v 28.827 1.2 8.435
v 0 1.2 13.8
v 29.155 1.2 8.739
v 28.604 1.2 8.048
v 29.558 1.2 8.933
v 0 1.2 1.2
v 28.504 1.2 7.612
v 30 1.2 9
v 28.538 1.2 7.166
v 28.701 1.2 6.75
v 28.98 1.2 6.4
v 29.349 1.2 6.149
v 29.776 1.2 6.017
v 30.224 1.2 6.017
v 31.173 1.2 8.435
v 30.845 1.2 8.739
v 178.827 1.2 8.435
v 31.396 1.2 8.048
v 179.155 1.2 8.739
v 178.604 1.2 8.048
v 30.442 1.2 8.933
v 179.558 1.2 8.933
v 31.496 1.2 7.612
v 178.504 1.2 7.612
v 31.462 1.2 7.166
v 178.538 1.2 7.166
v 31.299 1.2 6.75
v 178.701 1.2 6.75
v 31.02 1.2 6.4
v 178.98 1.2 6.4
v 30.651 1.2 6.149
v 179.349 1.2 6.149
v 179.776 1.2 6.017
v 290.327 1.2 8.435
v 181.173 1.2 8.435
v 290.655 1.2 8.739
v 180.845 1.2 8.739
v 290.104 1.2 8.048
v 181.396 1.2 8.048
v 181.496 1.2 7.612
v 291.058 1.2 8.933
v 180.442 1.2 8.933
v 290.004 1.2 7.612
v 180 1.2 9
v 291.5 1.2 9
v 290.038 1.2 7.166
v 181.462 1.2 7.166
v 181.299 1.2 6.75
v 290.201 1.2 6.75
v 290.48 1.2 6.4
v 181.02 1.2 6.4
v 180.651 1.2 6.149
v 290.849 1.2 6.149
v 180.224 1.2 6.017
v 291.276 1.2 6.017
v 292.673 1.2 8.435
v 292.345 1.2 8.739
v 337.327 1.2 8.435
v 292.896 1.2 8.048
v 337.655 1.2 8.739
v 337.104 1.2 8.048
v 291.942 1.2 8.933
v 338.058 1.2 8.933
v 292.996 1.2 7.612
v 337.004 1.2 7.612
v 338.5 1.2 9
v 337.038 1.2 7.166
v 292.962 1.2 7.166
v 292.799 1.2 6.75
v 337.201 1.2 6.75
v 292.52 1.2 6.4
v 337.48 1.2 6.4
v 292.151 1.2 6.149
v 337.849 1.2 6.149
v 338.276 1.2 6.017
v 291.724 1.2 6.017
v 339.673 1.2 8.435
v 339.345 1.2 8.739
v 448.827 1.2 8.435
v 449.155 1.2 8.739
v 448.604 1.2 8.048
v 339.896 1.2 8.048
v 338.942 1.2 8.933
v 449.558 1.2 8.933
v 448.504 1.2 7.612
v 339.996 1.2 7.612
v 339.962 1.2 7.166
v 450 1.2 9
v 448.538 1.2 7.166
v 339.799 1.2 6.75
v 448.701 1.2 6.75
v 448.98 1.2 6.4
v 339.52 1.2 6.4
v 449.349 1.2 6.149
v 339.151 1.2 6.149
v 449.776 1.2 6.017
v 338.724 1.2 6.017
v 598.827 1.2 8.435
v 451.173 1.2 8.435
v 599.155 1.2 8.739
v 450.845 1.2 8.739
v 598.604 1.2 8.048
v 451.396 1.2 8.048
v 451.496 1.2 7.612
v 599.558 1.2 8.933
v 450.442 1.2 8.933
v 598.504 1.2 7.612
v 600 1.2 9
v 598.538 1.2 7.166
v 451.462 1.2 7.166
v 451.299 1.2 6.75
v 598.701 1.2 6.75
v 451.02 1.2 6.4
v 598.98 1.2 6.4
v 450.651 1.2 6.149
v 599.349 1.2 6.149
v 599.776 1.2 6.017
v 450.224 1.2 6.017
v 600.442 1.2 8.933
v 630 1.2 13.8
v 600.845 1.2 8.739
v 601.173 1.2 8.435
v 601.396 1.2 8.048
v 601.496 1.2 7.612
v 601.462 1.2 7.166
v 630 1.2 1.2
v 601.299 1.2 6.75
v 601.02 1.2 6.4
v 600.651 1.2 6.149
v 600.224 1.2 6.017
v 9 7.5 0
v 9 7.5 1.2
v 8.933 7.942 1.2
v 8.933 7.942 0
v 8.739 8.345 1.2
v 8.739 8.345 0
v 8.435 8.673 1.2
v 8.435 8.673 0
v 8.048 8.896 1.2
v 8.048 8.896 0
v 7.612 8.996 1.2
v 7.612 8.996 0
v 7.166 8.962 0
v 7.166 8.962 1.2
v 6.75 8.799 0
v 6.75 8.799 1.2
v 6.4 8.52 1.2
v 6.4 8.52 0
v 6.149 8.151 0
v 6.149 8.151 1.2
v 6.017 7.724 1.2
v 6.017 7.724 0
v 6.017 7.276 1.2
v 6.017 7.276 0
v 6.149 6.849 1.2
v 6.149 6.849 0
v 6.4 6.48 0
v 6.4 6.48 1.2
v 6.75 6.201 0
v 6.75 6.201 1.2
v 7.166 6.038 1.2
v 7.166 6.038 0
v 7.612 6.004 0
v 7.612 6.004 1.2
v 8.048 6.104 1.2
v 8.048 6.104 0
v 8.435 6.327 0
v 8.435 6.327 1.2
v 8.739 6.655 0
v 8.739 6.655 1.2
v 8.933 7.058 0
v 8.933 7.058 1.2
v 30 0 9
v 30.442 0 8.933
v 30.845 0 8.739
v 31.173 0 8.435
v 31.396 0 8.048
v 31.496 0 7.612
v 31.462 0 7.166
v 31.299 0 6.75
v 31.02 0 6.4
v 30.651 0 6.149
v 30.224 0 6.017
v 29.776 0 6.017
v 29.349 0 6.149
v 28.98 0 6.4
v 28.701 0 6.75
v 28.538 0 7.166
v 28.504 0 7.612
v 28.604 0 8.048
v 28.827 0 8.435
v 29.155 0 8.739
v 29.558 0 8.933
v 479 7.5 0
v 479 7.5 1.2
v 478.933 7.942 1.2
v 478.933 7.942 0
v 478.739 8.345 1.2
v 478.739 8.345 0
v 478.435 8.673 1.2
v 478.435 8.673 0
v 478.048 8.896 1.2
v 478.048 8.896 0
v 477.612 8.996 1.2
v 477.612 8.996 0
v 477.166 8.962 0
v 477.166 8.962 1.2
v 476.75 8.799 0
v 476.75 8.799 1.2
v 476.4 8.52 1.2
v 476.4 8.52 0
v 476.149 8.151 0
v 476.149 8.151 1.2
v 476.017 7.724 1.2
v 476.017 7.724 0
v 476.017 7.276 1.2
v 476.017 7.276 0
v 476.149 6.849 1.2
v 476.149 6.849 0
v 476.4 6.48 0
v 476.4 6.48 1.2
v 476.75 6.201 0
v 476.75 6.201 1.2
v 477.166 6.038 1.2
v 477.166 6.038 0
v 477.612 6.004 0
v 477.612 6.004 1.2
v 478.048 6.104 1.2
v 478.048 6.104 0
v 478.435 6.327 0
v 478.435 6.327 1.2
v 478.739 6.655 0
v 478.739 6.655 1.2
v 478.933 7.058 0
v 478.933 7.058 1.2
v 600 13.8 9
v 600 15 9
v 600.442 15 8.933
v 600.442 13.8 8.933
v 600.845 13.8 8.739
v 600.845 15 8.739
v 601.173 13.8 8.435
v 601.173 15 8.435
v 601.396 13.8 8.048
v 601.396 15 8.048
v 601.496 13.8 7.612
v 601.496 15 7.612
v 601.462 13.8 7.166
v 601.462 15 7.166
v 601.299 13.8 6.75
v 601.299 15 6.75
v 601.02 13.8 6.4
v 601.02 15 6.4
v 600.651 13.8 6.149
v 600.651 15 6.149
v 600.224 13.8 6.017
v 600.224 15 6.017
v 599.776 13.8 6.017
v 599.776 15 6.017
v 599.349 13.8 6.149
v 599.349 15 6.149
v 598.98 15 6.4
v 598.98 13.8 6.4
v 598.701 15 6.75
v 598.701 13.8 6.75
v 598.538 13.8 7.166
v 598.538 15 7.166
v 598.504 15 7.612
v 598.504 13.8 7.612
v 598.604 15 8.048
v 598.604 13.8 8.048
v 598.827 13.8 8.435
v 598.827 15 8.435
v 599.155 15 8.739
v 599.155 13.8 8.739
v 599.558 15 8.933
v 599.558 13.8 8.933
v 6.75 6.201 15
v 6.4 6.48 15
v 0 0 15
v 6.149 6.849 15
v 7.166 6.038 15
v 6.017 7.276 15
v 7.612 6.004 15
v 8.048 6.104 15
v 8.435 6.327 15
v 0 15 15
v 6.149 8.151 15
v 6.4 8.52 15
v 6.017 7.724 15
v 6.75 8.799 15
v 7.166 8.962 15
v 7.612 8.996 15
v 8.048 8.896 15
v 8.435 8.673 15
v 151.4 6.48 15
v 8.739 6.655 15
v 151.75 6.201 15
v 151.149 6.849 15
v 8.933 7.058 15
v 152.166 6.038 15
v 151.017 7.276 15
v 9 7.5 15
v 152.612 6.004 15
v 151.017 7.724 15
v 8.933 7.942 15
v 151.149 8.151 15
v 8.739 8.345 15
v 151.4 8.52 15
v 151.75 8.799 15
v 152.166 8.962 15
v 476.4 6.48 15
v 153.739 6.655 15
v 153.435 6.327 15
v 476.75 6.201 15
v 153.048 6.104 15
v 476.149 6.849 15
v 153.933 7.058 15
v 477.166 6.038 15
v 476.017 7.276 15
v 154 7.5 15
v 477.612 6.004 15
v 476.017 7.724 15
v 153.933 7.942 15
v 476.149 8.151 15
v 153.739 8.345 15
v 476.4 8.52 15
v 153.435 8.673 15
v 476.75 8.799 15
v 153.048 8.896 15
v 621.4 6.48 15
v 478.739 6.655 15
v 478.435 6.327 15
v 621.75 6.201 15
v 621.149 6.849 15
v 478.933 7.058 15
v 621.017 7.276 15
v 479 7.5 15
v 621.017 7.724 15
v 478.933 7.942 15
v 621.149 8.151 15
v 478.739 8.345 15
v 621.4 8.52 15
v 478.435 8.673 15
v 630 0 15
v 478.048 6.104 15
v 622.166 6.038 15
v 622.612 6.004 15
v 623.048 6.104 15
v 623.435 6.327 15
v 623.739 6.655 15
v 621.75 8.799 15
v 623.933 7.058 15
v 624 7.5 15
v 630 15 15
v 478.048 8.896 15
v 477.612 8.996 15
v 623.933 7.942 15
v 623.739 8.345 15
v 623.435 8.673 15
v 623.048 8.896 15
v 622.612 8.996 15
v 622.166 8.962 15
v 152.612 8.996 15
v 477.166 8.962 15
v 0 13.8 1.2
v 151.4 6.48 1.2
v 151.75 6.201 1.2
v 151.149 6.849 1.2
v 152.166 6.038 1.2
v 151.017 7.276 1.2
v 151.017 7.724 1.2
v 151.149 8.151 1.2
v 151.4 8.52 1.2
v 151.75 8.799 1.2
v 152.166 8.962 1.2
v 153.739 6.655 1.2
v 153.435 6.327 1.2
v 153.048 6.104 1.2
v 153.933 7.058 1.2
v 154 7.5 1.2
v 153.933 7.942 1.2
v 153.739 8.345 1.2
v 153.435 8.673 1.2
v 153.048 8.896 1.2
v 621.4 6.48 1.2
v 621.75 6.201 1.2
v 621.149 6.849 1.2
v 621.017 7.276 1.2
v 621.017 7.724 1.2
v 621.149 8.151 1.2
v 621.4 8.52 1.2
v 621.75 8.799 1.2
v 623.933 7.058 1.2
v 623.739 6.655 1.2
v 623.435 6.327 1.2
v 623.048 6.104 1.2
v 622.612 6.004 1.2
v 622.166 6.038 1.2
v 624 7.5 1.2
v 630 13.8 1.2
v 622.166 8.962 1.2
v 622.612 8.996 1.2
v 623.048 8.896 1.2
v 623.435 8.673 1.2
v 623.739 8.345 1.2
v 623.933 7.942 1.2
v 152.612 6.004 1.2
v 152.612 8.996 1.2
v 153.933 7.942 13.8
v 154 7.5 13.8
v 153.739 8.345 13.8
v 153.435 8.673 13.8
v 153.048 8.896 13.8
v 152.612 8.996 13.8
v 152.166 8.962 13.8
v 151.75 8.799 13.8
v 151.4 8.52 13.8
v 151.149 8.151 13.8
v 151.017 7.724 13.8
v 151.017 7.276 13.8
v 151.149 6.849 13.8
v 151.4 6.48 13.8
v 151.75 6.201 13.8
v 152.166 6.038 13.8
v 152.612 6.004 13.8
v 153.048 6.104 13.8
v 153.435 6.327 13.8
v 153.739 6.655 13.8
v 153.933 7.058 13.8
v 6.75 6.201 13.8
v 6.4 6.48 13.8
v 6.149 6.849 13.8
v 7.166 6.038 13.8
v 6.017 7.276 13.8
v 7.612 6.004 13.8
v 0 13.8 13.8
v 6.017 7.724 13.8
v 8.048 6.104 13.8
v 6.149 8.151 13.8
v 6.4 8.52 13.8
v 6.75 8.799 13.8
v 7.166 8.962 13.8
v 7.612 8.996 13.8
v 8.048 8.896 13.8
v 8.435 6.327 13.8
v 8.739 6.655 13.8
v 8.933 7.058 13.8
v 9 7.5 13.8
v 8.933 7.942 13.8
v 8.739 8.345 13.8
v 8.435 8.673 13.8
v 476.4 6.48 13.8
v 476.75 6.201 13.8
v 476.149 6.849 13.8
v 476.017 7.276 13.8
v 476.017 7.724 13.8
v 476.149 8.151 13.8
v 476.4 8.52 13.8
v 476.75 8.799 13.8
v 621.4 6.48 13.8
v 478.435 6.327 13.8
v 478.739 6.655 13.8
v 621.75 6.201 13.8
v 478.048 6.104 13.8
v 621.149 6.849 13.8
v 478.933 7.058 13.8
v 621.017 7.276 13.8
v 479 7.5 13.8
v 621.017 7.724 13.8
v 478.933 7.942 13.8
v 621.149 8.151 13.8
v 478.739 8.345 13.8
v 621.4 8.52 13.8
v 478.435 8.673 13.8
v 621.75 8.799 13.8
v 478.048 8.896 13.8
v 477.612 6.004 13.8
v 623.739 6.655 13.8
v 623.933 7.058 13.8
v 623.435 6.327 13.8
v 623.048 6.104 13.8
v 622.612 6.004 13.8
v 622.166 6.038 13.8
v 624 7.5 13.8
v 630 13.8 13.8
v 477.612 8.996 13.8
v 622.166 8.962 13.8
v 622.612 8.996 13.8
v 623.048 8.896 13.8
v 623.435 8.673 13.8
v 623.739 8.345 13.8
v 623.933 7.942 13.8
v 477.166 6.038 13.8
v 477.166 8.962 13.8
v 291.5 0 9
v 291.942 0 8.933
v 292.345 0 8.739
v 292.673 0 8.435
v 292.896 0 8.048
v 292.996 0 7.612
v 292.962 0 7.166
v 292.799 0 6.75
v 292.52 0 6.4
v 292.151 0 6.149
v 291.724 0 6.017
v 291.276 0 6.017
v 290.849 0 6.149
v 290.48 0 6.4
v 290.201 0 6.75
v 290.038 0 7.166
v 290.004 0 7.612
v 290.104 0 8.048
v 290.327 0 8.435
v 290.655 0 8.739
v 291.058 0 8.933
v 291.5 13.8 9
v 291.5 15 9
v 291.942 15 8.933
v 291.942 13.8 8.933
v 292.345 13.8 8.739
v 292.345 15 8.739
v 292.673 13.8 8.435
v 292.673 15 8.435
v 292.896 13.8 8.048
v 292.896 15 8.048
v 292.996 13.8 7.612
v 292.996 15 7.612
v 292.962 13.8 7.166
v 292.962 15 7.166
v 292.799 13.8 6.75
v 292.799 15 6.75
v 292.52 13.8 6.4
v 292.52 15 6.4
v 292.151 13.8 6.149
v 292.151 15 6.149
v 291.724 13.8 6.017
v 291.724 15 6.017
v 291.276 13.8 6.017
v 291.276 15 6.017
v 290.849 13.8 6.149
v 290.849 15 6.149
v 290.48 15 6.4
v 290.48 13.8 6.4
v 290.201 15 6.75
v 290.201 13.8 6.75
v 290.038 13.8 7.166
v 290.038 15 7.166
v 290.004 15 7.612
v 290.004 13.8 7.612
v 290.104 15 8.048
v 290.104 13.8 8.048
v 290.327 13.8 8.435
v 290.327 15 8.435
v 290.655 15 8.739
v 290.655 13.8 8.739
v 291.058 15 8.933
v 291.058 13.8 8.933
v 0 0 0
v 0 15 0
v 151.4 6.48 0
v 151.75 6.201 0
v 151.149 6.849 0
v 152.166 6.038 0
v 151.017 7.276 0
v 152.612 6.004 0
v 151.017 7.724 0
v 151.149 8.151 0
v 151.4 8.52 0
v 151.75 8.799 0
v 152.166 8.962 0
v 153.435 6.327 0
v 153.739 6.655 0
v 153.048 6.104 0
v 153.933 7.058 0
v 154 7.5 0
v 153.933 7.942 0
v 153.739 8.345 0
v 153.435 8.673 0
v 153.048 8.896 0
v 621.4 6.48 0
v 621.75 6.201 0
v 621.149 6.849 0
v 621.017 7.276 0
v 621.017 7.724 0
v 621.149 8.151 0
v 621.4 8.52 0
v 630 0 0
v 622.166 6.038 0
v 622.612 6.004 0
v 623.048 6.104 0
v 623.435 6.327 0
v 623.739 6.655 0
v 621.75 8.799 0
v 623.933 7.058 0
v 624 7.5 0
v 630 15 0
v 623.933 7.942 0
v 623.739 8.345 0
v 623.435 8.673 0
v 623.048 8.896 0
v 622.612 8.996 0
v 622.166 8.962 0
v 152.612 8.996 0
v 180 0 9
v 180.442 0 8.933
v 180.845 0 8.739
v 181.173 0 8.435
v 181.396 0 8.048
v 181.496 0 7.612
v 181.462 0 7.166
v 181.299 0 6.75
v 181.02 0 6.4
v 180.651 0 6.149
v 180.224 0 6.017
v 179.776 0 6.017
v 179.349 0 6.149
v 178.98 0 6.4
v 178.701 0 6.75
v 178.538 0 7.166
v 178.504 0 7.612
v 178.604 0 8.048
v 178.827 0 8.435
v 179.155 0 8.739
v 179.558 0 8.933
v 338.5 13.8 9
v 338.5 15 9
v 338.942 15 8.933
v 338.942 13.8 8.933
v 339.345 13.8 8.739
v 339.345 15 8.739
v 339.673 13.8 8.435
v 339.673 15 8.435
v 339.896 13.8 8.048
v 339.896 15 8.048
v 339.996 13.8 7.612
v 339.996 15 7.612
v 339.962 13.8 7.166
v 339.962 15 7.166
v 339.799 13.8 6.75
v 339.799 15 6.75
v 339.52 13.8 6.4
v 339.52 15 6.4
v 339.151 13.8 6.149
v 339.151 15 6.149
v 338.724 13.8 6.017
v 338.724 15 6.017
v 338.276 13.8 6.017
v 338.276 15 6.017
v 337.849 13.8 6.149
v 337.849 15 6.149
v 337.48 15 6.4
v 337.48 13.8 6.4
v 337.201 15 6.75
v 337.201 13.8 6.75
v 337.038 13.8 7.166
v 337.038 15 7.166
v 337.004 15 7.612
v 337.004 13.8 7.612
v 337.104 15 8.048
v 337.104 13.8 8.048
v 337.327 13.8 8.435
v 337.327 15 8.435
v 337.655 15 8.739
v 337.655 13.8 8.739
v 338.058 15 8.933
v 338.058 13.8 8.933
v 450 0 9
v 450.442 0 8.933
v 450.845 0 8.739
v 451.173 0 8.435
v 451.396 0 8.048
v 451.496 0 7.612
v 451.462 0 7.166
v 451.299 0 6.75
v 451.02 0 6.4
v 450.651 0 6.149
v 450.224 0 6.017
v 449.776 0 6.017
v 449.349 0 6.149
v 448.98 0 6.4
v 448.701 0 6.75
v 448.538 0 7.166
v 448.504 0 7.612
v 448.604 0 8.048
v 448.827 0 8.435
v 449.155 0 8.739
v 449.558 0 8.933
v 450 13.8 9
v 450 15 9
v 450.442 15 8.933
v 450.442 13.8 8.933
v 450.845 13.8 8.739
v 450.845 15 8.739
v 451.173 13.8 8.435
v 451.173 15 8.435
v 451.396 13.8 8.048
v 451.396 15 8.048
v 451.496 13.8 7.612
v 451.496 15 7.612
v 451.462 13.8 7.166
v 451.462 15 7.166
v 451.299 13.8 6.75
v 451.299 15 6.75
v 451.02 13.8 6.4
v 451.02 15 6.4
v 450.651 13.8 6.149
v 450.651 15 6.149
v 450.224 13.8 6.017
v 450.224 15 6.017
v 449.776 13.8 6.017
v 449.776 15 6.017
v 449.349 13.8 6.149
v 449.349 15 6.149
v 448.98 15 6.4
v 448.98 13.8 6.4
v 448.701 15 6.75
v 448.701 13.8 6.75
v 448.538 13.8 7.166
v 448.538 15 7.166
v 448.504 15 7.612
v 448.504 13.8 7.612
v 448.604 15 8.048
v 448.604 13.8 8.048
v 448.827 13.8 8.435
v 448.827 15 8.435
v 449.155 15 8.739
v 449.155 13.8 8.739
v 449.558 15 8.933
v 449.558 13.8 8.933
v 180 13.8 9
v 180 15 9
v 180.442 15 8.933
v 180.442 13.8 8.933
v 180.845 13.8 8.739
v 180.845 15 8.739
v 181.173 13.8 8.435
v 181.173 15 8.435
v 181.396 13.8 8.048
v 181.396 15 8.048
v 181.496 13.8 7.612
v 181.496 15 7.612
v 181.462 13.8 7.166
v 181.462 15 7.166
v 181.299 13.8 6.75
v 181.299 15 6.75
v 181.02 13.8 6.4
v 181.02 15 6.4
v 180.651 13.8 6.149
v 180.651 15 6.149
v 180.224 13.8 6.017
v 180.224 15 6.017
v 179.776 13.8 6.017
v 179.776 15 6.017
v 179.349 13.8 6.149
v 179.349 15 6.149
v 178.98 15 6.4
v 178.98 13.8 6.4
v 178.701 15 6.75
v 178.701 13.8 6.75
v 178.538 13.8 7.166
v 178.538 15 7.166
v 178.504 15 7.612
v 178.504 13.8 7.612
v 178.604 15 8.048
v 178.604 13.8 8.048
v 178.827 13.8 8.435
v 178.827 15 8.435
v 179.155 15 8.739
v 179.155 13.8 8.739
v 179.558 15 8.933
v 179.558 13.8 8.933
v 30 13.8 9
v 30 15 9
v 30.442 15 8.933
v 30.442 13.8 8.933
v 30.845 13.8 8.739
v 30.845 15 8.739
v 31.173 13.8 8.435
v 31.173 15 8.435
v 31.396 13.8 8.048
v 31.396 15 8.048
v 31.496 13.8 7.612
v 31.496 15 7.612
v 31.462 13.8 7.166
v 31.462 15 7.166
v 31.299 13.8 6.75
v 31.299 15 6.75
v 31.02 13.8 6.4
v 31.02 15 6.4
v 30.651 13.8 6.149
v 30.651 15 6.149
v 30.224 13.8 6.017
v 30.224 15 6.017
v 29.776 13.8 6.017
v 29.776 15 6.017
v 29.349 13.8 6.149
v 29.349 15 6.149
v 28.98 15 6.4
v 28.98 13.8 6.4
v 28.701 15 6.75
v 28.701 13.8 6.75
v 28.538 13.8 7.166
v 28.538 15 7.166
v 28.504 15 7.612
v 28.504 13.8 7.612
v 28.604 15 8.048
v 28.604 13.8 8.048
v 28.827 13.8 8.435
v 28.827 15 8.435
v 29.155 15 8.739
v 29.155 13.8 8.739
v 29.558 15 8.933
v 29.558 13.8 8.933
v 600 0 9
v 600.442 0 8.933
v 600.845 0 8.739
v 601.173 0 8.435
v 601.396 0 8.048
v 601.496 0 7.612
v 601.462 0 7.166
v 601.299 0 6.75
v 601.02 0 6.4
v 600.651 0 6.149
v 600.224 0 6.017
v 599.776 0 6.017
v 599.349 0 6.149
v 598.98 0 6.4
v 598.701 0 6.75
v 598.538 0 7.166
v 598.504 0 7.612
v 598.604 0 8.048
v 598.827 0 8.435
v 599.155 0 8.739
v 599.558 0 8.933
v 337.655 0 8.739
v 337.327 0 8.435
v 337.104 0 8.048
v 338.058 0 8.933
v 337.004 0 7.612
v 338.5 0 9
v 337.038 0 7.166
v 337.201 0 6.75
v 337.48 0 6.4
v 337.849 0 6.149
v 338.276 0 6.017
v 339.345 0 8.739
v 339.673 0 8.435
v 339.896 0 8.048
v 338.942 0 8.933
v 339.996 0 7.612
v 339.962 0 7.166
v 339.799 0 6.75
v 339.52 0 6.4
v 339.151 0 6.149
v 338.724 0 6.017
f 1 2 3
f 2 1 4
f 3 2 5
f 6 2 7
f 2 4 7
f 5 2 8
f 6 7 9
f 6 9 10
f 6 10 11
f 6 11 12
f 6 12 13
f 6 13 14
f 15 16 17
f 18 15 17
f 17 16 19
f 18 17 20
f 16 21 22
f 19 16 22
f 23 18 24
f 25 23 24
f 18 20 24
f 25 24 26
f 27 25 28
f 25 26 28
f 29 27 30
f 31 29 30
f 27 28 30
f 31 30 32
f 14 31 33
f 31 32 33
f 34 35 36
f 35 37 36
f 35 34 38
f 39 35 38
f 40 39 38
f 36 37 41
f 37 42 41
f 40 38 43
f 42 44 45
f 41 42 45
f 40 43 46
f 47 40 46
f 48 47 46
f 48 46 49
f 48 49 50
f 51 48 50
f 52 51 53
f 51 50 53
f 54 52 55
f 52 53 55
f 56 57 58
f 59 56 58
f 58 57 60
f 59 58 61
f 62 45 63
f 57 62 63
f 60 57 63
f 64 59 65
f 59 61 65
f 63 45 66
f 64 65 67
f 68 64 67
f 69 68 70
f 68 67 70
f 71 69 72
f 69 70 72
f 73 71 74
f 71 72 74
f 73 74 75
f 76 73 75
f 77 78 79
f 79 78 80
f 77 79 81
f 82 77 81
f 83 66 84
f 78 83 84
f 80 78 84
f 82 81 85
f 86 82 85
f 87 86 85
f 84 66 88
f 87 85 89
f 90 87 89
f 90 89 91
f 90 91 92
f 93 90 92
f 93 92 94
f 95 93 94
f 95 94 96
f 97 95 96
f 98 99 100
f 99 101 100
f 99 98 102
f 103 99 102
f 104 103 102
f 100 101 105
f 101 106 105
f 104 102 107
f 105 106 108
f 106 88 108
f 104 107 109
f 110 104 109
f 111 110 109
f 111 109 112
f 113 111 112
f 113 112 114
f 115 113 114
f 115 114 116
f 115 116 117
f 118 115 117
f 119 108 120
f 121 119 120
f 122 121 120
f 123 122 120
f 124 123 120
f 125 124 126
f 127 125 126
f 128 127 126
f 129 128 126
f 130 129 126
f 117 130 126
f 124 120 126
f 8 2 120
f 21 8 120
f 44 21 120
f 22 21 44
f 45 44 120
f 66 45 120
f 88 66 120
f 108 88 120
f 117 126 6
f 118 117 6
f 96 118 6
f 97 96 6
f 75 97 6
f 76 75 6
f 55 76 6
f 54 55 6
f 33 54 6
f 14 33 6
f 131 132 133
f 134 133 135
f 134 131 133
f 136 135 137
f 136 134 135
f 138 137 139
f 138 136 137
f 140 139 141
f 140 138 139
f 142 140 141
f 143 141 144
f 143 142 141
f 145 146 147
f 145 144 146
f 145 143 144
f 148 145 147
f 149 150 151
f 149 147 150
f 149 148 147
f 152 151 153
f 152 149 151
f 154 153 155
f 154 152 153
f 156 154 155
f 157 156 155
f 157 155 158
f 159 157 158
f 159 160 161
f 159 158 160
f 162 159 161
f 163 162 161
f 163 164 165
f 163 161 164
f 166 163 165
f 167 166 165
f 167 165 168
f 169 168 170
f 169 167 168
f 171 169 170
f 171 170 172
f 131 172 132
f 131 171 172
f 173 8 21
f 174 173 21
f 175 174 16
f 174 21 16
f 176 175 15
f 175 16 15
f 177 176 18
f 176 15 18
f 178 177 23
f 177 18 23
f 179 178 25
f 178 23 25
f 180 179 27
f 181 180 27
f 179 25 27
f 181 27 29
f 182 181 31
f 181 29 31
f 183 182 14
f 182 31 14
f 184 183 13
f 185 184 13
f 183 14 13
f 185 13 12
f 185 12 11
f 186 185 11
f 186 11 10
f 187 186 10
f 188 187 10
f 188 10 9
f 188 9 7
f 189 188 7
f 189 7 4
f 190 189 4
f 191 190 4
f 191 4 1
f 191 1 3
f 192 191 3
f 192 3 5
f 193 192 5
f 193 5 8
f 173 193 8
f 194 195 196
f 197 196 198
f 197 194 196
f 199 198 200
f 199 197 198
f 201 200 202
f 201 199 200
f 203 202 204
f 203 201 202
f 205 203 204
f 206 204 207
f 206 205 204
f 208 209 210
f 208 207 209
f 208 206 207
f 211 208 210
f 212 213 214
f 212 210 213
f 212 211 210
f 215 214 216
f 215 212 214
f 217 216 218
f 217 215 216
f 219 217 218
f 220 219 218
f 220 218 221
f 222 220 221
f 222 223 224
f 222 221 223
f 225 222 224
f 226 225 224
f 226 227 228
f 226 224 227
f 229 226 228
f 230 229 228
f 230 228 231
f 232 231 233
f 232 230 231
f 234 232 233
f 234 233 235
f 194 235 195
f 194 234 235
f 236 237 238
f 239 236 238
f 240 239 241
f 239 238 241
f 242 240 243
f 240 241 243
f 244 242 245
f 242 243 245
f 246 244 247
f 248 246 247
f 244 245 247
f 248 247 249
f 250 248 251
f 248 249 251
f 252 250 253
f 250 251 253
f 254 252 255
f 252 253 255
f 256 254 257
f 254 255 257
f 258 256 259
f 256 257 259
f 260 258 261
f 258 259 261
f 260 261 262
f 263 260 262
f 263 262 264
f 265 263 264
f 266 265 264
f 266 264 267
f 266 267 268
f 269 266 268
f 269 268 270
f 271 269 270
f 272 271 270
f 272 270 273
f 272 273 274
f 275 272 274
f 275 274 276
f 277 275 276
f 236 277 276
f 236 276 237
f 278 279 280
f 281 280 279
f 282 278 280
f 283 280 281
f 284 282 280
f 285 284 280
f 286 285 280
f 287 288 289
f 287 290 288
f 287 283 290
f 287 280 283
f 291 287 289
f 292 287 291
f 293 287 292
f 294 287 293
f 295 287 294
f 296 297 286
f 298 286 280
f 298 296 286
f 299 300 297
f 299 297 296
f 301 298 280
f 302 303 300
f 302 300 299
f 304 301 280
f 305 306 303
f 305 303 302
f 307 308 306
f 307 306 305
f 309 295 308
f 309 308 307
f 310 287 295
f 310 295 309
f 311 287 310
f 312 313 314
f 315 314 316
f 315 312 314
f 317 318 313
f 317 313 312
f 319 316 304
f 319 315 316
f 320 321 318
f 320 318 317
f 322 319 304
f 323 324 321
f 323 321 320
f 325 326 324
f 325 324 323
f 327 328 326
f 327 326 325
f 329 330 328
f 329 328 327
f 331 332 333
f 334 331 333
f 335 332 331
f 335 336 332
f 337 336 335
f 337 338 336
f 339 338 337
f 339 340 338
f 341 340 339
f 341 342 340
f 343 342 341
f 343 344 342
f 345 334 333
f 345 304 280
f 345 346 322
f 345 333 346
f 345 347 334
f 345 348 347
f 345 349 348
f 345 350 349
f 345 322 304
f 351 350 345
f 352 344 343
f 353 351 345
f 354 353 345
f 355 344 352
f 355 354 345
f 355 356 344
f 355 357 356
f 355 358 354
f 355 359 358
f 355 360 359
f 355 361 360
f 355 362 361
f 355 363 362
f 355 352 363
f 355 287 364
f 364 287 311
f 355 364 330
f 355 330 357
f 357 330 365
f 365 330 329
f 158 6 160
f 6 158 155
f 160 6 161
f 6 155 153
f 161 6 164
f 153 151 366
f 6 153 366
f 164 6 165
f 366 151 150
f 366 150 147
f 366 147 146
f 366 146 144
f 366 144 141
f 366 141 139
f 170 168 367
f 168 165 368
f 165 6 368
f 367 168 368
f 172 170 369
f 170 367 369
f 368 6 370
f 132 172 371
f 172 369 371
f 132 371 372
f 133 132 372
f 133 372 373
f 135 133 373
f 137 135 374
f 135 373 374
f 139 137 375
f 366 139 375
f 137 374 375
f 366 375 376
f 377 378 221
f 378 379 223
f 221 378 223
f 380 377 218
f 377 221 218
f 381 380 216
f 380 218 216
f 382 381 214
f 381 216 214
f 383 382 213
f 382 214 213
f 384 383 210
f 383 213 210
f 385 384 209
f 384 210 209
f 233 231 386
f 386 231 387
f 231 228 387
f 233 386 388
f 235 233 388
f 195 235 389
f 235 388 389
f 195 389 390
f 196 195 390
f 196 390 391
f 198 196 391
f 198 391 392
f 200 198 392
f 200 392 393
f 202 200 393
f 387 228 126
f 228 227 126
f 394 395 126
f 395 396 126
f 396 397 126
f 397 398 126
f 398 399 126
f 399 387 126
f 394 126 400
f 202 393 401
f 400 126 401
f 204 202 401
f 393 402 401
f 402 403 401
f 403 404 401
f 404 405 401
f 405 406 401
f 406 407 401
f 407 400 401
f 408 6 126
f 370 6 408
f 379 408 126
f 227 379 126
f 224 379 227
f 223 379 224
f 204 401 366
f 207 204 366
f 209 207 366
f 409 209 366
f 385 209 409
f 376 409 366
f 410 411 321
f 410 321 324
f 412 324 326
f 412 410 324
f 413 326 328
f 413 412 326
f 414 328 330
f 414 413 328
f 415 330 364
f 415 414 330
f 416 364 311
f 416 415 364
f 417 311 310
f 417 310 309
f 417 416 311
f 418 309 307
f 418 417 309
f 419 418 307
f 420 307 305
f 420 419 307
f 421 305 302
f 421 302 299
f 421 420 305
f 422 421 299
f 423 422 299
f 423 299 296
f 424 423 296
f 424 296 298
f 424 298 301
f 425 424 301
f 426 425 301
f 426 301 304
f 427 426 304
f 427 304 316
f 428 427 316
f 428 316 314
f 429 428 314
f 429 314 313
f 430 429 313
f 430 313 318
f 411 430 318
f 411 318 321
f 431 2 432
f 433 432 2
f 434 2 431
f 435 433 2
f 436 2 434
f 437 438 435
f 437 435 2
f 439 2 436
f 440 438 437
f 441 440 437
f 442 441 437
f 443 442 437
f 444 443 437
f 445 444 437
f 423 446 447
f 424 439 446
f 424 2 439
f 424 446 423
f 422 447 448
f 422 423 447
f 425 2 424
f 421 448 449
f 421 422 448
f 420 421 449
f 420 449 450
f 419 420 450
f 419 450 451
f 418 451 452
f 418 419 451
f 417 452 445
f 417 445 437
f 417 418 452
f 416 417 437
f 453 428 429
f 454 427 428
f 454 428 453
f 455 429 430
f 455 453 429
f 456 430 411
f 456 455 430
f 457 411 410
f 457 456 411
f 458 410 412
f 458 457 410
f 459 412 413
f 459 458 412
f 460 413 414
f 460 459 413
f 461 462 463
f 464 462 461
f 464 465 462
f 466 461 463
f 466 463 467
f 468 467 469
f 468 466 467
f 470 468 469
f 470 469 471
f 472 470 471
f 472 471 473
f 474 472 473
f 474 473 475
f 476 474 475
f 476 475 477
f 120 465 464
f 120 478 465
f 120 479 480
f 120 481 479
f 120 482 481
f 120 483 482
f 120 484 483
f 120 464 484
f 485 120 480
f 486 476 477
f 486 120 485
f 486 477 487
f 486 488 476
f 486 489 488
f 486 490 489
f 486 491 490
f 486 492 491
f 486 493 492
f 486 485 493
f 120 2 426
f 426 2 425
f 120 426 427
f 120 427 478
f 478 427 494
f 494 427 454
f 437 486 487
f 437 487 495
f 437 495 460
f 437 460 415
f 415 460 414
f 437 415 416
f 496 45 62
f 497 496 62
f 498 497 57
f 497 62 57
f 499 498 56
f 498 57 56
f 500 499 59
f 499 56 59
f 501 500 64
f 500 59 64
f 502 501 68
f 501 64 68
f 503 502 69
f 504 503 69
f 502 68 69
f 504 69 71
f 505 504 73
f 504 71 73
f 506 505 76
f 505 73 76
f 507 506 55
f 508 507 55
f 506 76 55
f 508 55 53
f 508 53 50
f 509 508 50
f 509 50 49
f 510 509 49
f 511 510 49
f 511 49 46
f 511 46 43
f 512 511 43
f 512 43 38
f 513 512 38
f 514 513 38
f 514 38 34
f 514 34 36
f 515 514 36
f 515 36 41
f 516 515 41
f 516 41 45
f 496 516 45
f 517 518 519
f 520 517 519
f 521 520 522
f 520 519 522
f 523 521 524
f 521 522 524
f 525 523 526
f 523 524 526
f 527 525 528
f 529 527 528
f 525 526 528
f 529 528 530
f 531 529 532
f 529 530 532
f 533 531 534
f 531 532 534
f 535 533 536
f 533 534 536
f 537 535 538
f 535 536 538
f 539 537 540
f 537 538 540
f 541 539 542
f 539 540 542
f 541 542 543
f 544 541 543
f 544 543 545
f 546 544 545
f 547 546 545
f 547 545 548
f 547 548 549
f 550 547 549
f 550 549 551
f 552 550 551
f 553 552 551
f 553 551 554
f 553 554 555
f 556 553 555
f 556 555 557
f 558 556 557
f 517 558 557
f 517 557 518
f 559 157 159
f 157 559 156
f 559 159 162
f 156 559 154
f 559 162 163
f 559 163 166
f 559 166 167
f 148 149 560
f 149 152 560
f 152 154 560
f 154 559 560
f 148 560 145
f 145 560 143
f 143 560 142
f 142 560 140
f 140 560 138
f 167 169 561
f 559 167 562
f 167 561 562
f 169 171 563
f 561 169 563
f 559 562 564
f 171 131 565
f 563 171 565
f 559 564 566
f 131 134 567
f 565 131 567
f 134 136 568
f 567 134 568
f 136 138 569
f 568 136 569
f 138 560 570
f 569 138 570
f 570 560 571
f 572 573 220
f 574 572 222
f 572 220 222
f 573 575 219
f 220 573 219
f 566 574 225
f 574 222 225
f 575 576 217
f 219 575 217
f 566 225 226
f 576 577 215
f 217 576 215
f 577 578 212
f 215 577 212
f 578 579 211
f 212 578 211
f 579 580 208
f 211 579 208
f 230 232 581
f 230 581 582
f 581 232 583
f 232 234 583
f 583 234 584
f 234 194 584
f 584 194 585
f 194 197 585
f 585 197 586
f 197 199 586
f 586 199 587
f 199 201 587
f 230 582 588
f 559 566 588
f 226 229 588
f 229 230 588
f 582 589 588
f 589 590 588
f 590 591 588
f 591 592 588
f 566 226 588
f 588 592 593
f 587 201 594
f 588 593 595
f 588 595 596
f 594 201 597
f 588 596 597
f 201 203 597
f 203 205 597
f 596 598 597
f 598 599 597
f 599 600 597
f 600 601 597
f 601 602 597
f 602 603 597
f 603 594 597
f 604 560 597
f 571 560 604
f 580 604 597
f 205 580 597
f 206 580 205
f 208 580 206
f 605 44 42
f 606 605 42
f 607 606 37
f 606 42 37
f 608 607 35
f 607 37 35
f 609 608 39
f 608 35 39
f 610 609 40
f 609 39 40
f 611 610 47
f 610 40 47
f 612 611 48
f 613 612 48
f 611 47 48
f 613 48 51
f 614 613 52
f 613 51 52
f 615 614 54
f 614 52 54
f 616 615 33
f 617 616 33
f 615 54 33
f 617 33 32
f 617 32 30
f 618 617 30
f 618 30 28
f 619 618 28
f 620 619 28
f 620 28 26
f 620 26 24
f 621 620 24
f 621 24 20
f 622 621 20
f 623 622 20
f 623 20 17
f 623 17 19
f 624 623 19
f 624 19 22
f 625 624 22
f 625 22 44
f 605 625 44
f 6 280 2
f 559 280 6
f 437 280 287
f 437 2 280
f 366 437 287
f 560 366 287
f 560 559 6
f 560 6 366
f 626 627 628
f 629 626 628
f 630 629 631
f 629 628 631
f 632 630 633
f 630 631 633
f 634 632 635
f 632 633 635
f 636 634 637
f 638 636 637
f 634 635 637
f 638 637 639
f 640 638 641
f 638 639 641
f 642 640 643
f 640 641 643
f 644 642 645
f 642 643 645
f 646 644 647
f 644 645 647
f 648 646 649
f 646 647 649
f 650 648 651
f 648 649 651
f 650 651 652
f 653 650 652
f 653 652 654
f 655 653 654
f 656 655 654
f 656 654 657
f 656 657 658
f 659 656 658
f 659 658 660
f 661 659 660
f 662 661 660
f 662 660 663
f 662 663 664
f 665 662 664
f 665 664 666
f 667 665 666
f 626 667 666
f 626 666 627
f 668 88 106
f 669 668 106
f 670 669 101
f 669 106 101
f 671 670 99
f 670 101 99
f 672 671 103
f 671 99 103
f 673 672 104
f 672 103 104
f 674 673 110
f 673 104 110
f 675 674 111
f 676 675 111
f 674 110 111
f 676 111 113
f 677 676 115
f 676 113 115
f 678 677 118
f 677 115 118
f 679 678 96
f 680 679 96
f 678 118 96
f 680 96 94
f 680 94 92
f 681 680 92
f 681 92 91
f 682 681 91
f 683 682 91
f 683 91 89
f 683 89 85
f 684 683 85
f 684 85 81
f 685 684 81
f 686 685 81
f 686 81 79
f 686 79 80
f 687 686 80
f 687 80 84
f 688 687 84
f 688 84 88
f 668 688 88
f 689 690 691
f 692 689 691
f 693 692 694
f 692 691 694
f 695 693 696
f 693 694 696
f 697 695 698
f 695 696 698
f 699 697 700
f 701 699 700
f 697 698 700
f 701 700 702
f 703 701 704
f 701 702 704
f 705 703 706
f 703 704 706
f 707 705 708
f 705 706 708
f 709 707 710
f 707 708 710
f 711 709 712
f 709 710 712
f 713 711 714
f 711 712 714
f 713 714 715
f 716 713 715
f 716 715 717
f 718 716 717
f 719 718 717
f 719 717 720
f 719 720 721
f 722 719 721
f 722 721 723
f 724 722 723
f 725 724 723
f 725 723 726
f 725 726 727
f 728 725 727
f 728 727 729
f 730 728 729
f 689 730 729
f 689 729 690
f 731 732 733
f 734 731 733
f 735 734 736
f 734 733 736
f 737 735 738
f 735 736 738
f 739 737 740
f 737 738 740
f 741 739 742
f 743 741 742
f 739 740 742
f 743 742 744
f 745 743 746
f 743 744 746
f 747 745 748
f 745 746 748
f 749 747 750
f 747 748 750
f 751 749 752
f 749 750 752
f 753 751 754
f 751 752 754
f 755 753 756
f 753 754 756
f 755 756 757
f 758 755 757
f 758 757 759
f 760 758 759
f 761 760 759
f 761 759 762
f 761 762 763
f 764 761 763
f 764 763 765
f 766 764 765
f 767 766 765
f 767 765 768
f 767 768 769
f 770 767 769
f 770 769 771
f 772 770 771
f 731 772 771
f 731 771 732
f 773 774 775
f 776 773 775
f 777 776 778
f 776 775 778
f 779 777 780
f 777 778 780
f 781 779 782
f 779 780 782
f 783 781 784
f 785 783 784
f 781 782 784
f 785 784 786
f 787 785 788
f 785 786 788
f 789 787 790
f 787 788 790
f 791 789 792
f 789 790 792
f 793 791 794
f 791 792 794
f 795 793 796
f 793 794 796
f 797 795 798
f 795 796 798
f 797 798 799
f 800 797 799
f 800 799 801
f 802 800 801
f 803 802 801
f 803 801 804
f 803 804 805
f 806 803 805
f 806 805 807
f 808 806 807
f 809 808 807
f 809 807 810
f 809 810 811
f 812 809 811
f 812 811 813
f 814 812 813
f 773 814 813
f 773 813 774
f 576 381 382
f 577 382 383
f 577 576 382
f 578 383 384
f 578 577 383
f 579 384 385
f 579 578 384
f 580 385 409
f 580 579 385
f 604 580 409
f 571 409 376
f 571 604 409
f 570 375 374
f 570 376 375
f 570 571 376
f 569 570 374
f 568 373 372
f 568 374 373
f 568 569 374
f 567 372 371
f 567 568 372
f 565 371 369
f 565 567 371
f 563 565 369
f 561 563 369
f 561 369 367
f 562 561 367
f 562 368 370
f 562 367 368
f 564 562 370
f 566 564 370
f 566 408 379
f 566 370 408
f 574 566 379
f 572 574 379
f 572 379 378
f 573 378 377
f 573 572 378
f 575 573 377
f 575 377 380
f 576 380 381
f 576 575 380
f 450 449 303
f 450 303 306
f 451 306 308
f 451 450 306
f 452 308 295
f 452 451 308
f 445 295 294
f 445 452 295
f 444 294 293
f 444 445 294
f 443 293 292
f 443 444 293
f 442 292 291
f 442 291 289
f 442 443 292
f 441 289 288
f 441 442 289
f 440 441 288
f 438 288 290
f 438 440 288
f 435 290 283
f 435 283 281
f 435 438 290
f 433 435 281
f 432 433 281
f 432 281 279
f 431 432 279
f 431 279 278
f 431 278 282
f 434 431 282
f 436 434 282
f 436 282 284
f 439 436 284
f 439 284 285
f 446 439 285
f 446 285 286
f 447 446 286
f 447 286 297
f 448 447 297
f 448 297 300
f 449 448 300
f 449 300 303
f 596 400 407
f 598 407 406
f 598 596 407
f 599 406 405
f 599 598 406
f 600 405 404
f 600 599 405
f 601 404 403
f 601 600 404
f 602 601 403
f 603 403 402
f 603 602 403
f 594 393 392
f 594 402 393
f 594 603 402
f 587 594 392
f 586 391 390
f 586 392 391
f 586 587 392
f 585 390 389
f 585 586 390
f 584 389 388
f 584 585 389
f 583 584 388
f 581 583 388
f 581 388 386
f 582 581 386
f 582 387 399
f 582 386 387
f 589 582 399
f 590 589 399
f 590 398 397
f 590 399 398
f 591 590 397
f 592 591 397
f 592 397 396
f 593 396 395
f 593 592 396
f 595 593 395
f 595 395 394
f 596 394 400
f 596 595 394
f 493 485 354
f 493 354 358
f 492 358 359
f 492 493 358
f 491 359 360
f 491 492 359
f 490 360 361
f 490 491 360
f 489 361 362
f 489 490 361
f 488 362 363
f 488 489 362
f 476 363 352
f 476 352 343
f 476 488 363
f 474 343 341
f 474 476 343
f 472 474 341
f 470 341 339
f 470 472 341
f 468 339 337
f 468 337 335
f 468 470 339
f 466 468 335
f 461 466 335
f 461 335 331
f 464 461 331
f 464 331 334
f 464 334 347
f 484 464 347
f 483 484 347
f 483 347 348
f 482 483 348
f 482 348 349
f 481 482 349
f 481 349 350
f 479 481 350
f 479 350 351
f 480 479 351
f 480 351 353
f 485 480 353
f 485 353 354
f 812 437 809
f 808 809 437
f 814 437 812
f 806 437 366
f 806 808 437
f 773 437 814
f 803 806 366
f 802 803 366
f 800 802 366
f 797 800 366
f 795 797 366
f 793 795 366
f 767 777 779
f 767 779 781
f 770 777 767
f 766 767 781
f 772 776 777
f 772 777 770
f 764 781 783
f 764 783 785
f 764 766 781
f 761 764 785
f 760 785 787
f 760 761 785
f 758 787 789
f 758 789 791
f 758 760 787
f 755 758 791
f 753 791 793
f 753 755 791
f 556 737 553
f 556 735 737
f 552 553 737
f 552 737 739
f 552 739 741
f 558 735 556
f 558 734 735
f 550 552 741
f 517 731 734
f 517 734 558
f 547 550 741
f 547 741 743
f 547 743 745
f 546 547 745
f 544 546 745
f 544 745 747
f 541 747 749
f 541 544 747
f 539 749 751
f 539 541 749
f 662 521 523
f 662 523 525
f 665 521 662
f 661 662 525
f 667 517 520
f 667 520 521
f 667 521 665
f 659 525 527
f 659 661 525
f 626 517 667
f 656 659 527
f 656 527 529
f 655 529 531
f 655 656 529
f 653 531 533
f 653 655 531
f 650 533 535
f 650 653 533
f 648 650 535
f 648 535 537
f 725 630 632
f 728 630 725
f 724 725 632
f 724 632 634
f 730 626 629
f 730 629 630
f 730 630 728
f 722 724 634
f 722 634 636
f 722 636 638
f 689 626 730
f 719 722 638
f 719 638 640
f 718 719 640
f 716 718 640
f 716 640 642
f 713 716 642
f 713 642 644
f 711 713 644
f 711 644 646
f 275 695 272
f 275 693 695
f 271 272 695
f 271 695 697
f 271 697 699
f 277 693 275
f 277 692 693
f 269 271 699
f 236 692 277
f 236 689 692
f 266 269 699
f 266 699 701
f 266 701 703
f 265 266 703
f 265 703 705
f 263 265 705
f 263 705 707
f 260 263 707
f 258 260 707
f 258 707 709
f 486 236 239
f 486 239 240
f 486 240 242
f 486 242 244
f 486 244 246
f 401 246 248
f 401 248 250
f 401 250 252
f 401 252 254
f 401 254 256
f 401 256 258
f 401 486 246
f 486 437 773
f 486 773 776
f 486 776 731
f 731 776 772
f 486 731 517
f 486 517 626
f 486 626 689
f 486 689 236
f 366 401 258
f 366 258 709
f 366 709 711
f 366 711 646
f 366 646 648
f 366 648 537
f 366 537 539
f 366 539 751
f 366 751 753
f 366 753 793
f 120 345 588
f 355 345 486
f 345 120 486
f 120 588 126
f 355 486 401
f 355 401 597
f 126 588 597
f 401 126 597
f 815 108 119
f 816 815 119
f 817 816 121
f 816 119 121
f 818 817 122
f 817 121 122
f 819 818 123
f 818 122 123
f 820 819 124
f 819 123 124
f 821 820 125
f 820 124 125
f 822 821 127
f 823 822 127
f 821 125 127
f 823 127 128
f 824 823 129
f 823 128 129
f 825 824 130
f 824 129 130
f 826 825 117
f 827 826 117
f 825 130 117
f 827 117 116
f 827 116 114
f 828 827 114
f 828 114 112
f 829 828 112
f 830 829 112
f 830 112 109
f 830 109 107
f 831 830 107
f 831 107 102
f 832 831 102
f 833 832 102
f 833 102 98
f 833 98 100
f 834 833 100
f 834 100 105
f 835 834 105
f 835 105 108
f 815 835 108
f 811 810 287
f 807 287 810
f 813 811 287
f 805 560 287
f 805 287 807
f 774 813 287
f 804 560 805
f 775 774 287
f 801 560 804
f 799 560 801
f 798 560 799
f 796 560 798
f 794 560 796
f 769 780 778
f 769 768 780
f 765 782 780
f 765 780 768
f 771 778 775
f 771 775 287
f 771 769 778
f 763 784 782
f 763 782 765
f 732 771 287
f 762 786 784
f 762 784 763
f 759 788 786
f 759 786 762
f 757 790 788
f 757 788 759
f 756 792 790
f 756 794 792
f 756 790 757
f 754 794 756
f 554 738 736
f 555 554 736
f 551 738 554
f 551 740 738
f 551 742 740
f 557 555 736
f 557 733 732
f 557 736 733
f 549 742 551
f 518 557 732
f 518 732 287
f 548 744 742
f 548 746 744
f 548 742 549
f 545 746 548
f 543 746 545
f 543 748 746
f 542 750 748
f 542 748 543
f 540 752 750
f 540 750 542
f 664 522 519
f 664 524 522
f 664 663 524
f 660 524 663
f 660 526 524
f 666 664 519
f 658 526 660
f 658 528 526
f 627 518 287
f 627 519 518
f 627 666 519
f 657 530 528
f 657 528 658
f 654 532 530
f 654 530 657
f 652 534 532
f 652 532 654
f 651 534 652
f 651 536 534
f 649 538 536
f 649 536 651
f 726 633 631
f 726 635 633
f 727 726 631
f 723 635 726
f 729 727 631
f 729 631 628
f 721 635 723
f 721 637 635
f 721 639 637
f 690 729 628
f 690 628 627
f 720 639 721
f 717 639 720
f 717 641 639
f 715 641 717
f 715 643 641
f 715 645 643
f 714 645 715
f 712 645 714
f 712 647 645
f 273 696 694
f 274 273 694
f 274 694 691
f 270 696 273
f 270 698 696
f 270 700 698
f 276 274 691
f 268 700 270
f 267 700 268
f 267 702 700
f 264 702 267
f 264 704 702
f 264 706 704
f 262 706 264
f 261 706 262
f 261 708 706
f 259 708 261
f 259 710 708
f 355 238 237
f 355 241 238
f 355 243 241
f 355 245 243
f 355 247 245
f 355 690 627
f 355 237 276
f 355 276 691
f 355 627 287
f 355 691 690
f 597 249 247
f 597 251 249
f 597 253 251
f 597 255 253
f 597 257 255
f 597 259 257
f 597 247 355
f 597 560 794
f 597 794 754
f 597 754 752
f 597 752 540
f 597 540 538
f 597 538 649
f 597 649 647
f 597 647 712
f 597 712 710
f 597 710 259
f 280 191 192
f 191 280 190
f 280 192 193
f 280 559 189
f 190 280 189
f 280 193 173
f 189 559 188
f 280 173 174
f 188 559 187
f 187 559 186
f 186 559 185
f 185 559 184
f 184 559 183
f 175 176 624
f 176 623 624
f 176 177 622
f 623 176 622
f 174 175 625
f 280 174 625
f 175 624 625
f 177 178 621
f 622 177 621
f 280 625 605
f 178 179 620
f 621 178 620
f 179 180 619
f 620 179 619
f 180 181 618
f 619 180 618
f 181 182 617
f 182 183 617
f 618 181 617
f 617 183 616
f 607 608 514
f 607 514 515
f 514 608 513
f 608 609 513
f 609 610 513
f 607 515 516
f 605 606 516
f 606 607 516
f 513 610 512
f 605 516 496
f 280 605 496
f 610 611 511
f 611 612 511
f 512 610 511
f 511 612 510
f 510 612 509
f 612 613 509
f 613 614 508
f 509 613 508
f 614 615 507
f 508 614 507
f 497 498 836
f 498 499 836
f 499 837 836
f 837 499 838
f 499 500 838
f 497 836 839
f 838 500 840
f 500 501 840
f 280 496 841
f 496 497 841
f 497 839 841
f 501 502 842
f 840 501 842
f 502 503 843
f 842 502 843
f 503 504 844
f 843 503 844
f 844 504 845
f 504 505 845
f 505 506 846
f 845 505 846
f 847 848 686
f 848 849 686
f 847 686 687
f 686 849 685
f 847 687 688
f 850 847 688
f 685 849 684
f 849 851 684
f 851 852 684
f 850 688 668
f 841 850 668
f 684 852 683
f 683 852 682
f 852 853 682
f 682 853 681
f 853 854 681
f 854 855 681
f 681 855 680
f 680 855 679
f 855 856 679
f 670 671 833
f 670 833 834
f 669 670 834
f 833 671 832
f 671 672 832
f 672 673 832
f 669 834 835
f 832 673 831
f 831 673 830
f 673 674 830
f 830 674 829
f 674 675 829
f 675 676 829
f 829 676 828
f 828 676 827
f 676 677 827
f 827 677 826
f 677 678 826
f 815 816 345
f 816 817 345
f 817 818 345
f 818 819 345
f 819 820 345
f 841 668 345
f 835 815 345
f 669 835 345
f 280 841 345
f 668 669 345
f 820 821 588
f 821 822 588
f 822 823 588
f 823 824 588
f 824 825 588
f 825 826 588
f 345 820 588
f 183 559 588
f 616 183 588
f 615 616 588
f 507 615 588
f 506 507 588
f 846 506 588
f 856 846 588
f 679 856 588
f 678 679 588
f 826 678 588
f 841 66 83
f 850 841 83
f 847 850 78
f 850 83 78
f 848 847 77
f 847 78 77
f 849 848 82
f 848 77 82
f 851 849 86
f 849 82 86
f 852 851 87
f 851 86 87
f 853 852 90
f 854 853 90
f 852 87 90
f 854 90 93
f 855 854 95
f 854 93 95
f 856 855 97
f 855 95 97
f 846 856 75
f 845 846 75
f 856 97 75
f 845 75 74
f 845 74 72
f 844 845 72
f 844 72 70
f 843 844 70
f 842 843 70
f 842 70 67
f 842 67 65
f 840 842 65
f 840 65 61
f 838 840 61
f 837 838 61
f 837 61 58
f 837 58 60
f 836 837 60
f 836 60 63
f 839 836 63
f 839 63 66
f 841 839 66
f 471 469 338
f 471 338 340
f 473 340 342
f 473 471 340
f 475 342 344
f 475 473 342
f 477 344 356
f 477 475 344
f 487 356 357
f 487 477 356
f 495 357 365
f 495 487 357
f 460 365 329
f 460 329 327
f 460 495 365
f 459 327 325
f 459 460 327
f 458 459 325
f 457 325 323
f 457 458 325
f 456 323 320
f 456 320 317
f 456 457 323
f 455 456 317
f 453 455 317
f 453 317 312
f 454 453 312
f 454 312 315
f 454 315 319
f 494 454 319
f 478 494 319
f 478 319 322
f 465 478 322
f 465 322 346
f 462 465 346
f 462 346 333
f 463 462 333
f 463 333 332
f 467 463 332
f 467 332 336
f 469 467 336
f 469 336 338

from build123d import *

# Parameters (mm, degrees)
SKETCH_1_W          = 630
SKETCH_1_H          = 15
SKETCH_1_R          = 1.5
EXTRUDE_1_DEPTH     = 15
SKETCH_3_R          = 1.5
CUT_EXTRUDE_1_DEPTH = 631.357041684
SKETCH_4_W          = 12.6
SKETCH_4_H          = 12.6
CUT_EXTRUDE_2_DEPTH = 631.357041684
SKETCH_5_R          = 1.5
CUT_EXTRUDE_3_DEPTH = 631.357041684


with BuildPart() as part:
    # ｽｹｯﾁ1 → ﾎﾞｽ - 押し出し1 (new body)
    with BuildSketch(Plane.XY):
        with Locations((315, 7.5)):
            Rectangle(SKETCH_1_W, SKETCH_1_H)
        with Locations((7.5, 7.5)):
            Circle(SKETCH_1_R, mode=Mode.SUBTRACT)
        with Locations((622.5, 7.5)):
            Circle(SKETCH_1_R, mode=Mode.SUBTRACT)
        with Locations((152.5, 7.5)):
            Circle(SKETCH_1_R, mode=Mode.SUBTRACT)
        with Locations((477.5, 7.5)):
            Circle(SKETCH_1_R, mode=Mode.SUBTRACT)
    extrude(amount=EXTRUDE_1_DEPTH)

    # ｽｹｯﾁ3 → ｶｯﾄ - 押し出し1 (cut, through all)
    with BuildSketch(Plane(origin=(0, 15, 0), x_dir=(1, 0, 0), z_dir=(0, 1, 0))):
        with Locations(Location((30, -7.5, 0), (0, 0, 270))):
            Circle(SKETCH_3_R)
        with Locations(Location((600, -7.5, 0), (0, 0, 270))):
            Circle(SKETCH_3_R)
        with Locations(Location((180, -7.5, 0), (0, 0, 270))):
            Circle(SKETCH_3_R)
        with Locations(Location((450, -7.5, 0), (0, 0, 270))):
            Circle(SKETCH_3_R)
    extrude(amount=-CUT_EXTRUDE_1_DEPTH, mode=Mode.SUBTRACT)

    # ｽｹｯﾁ4 → ｶｯﾄ - 押し出し2 (cut, through all)
    with BuildSketch(Plane(origin=(630, 0, 0), x_dir=(0, 0, -1), z_dir=(1, 0, 0))):
        with Locations((-7.5, 7.5)):
            Rectangle(SKETCH_4_W, SKETCH_4_H)
    extrude(amount=-CUT_EXTRUDE_2_DEPTH, mode=Mode.SUBTRACT)

    # ｽｹｯﾁ5 → ｶｯﾄ - 押し出し3 (cut, through all)
    with BuildSketch(Plane(origin=(0, 15, 0), x_dir=(1, 0, 0), z_dir=(0, 1, 0))):
        with Locations(Location((291.5, -7.5, 0), (0, 0, 270))):
            Circle(SKETCH_5_R)
        with Locations(Location((338.5, -7.5, 0), (0, 0, 270))):
            Circle(SKETCH_5_R)
    extrude(amount=-CUT_EXTRUDE_3_DEPTH, mode=Mode.SUBTRACT)


solid = part.part
